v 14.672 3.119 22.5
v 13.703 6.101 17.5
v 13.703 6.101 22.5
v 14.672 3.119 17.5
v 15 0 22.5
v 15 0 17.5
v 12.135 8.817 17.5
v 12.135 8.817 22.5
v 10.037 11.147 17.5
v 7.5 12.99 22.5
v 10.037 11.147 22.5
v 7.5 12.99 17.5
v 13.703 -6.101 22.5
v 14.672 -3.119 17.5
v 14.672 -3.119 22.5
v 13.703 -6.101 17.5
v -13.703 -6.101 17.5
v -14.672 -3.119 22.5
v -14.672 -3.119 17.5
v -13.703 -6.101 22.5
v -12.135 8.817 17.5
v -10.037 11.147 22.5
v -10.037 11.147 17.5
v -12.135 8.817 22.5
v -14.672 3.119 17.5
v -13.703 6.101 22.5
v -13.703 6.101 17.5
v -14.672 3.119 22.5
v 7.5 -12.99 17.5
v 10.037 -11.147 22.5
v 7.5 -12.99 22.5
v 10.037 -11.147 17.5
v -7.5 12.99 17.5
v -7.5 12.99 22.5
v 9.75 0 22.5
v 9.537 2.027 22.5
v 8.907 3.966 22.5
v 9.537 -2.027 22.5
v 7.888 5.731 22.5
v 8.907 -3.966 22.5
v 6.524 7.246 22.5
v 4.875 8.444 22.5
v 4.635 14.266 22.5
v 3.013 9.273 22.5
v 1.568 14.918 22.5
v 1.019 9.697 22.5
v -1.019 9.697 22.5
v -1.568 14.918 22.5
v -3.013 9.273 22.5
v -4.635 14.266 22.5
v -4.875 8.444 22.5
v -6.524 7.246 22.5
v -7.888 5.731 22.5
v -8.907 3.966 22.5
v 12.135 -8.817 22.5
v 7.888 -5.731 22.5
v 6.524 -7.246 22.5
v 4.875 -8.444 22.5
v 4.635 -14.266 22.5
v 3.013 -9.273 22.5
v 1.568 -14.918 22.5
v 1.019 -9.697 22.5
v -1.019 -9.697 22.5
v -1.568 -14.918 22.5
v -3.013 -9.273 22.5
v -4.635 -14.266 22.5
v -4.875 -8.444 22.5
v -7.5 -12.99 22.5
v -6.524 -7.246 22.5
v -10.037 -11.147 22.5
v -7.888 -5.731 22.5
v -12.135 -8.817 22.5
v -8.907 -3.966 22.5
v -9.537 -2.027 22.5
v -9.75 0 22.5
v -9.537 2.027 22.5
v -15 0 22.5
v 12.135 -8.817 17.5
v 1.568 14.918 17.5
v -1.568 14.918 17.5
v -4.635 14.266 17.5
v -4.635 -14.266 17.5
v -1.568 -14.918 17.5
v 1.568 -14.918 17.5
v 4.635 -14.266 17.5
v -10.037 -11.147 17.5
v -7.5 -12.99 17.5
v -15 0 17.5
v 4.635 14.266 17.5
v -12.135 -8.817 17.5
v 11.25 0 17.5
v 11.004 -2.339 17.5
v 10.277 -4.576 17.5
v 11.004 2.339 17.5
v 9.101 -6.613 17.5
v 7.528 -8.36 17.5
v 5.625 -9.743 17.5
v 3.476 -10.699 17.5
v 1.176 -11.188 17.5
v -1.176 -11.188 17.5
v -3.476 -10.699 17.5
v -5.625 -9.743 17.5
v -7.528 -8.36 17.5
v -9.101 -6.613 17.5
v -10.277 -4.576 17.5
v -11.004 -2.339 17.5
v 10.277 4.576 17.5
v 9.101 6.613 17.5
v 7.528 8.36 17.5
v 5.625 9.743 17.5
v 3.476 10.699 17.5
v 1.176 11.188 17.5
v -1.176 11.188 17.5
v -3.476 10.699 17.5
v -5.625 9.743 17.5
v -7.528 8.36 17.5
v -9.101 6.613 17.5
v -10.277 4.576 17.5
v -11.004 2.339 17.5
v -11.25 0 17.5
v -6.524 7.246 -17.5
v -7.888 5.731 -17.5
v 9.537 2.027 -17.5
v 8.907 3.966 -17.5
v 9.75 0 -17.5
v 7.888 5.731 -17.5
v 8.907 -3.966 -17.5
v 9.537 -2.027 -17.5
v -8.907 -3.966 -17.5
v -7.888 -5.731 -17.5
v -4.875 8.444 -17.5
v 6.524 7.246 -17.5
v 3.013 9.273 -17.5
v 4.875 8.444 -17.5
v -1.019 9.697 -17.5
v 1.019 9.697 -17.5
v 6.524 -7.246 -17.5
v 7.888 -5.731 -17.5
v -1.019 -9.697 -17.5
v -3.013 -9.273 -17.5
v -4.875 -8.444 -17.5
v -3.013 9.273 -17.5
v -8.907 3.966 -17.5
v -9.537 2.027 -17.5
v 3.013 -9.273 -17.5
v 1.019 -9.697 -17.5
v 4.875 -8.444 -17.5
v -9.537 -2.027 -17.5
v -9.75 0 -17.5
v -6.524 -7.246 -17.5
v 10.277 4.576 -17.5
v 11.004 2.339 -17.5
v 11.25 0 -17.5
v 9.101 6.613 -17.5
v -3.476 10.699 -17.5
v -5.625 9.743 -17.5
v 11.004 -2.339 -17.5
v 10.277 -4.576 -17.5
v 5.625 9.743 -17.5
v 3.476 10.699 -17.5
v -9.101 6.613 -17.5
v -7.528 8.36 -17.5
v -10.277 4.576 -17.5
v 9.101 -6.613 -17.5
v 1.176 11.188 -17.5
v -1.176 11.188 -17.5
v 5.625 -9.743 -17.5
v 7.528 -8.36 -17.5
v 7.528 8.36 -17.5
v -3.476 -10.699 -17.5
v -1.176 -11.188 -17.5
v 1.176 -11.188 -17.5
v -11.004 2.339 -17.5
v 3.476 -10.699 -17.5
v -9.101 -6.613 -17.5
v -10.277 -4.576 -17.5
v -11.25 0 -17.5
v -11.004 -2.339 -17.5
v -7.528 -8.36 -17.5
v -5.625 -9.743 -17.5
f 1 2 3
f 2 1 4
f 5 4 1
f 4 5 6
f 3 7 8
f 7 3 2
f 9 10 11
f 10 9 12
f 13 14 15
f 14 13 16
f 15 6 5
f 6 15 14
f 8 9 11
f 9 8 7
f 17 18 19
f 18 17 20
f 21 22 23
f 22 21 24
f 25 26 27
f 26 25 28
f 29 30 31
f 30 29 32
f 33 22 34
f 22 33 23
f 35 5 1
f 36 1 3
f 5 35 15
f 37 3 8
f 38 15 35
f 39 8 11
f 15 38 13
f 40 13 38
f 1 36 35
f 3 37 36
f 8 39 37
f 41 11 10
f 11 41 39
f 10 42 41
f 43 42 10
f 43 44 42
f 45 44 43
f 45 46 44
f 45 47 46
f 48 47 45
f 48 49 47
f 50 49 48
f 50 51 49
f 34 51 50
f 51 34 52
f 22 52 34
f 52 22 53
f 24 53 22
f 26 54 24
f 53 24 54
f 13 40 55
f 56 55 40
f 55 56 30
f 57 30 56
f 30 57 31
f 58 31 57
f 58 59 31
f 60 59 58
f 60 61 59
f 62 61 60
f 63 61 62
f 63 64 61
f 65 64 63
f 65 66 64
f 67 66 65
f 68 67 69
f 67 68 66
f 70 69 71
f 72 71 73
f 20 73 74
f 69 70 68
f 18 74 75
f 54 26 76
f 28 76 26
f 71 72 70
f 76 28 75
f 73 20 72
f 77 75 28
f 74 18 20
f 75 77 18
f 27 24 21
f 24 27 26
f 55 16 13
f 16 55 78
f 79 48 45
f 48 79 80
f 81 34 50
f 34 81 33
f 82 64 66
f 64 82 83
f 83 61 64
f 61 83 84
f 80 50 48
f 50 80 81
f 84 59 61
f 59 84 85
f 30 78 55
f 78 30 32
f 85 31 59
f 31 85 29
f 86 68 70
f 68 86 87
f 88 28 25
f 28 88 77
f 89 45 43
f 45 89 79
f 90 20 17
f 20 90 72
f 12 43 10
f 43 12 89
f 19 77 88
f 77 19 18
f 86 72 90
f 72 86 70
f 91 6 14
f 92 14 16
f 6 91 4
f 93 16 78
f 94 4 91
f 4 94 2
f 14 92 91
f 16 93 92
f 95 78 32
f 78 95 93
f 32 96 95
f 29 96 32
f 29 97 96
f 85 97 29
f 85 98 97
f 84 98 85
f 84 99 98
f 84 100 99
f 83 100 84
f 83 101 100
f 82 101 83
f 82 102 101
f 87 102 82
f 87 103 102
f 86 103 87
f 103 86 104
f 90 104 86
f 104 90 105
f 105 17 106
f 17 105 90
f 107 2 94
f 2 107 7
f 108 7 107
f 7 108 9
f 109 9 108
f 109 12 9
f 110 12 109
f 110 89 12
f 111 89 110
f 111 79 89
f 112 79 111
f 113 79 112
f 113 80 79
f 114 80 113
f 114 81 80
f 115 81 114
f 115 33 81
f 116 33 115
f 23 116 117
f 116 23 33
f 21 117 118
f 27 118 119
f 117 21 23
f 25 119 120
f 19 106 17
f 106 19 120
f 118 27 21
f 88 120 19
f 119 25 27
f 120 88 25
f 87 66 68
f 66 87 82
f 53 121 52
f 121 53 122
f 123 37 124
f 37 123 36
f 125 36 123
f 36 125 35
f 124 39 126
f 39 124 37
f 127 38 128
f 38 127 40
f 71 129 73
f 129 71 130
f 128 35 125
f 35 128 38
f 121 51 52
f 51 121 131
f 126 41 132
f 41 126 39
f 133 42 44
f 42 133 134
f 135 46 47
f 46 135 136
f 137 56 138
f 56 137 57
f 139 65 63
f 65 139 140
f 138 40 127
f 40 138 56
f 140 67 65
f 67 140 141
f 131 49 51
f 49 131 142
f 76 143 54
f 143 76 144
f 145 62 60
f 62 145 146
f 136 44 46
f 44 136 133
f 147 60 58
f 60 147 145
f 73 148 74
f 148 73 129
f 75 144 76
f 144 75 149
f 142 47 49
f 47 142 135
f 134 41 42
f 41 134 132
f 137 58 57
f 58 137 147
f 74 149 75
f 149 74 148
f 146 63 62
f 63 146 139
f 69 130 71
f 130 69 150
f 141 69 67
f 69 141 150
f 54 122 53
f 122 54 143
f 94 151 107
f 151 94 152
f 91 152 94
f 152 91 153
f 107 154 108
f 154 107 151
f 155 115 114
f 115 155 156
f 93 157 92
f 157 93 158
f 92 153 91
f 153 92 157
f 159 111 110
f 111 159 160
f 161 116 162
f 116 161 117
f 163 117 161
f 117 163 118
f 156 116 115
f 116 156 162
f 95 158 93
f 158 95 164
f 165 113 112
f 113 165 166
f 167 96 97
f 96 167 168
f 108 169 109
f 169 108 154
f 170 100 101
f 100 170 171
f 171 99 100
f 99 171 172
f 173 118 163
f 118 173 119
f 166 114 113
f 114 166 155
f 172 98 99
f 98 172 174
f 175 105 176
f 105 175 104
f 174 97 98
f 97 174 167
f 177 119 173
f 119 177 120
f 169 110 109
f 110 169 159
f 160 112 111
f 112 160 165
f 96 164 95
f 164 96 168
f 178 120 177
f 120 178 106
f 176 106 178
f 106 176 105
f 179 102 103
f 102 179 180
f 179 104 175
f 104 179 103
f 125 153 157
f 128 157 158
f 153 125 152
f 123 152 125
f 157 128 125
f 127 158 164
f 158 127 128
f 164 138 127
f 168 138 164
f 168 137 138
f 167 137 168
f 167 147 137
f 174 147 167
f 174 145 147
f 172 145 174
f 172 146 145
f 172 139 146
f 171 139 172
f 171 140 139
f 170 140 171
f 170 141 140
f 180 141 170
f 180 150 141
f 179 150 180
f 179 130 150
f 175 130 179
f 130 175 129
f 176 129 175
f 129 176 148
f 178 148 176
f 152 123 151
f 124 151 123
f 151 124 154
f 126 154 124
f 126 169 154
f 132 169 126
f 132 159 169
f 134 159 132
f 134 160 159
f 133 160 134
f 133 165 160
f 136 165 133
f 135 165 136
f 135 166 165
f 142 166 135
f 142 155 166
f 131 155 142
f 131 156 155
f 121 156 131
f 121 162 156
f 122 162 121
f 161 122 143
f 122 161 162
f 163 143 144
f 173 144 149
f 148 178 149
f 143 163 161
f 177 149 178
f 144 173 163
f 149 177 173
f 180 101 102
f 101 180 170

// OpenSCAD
ocular();
module top(){
    difference(){
        cylinder(d=30, h=5, center=true);
        cylinder(d=23-0.5-3, h=15, center=true);
    }
}
module ocular(){
    translate([0,0,35/2+5/2])
    top();
    difference(){
        cylinder(d=23-0.5, h = 35, center = true);
        cylinder(d=23-0.5-3, h = 40, center = true);
    }
}
